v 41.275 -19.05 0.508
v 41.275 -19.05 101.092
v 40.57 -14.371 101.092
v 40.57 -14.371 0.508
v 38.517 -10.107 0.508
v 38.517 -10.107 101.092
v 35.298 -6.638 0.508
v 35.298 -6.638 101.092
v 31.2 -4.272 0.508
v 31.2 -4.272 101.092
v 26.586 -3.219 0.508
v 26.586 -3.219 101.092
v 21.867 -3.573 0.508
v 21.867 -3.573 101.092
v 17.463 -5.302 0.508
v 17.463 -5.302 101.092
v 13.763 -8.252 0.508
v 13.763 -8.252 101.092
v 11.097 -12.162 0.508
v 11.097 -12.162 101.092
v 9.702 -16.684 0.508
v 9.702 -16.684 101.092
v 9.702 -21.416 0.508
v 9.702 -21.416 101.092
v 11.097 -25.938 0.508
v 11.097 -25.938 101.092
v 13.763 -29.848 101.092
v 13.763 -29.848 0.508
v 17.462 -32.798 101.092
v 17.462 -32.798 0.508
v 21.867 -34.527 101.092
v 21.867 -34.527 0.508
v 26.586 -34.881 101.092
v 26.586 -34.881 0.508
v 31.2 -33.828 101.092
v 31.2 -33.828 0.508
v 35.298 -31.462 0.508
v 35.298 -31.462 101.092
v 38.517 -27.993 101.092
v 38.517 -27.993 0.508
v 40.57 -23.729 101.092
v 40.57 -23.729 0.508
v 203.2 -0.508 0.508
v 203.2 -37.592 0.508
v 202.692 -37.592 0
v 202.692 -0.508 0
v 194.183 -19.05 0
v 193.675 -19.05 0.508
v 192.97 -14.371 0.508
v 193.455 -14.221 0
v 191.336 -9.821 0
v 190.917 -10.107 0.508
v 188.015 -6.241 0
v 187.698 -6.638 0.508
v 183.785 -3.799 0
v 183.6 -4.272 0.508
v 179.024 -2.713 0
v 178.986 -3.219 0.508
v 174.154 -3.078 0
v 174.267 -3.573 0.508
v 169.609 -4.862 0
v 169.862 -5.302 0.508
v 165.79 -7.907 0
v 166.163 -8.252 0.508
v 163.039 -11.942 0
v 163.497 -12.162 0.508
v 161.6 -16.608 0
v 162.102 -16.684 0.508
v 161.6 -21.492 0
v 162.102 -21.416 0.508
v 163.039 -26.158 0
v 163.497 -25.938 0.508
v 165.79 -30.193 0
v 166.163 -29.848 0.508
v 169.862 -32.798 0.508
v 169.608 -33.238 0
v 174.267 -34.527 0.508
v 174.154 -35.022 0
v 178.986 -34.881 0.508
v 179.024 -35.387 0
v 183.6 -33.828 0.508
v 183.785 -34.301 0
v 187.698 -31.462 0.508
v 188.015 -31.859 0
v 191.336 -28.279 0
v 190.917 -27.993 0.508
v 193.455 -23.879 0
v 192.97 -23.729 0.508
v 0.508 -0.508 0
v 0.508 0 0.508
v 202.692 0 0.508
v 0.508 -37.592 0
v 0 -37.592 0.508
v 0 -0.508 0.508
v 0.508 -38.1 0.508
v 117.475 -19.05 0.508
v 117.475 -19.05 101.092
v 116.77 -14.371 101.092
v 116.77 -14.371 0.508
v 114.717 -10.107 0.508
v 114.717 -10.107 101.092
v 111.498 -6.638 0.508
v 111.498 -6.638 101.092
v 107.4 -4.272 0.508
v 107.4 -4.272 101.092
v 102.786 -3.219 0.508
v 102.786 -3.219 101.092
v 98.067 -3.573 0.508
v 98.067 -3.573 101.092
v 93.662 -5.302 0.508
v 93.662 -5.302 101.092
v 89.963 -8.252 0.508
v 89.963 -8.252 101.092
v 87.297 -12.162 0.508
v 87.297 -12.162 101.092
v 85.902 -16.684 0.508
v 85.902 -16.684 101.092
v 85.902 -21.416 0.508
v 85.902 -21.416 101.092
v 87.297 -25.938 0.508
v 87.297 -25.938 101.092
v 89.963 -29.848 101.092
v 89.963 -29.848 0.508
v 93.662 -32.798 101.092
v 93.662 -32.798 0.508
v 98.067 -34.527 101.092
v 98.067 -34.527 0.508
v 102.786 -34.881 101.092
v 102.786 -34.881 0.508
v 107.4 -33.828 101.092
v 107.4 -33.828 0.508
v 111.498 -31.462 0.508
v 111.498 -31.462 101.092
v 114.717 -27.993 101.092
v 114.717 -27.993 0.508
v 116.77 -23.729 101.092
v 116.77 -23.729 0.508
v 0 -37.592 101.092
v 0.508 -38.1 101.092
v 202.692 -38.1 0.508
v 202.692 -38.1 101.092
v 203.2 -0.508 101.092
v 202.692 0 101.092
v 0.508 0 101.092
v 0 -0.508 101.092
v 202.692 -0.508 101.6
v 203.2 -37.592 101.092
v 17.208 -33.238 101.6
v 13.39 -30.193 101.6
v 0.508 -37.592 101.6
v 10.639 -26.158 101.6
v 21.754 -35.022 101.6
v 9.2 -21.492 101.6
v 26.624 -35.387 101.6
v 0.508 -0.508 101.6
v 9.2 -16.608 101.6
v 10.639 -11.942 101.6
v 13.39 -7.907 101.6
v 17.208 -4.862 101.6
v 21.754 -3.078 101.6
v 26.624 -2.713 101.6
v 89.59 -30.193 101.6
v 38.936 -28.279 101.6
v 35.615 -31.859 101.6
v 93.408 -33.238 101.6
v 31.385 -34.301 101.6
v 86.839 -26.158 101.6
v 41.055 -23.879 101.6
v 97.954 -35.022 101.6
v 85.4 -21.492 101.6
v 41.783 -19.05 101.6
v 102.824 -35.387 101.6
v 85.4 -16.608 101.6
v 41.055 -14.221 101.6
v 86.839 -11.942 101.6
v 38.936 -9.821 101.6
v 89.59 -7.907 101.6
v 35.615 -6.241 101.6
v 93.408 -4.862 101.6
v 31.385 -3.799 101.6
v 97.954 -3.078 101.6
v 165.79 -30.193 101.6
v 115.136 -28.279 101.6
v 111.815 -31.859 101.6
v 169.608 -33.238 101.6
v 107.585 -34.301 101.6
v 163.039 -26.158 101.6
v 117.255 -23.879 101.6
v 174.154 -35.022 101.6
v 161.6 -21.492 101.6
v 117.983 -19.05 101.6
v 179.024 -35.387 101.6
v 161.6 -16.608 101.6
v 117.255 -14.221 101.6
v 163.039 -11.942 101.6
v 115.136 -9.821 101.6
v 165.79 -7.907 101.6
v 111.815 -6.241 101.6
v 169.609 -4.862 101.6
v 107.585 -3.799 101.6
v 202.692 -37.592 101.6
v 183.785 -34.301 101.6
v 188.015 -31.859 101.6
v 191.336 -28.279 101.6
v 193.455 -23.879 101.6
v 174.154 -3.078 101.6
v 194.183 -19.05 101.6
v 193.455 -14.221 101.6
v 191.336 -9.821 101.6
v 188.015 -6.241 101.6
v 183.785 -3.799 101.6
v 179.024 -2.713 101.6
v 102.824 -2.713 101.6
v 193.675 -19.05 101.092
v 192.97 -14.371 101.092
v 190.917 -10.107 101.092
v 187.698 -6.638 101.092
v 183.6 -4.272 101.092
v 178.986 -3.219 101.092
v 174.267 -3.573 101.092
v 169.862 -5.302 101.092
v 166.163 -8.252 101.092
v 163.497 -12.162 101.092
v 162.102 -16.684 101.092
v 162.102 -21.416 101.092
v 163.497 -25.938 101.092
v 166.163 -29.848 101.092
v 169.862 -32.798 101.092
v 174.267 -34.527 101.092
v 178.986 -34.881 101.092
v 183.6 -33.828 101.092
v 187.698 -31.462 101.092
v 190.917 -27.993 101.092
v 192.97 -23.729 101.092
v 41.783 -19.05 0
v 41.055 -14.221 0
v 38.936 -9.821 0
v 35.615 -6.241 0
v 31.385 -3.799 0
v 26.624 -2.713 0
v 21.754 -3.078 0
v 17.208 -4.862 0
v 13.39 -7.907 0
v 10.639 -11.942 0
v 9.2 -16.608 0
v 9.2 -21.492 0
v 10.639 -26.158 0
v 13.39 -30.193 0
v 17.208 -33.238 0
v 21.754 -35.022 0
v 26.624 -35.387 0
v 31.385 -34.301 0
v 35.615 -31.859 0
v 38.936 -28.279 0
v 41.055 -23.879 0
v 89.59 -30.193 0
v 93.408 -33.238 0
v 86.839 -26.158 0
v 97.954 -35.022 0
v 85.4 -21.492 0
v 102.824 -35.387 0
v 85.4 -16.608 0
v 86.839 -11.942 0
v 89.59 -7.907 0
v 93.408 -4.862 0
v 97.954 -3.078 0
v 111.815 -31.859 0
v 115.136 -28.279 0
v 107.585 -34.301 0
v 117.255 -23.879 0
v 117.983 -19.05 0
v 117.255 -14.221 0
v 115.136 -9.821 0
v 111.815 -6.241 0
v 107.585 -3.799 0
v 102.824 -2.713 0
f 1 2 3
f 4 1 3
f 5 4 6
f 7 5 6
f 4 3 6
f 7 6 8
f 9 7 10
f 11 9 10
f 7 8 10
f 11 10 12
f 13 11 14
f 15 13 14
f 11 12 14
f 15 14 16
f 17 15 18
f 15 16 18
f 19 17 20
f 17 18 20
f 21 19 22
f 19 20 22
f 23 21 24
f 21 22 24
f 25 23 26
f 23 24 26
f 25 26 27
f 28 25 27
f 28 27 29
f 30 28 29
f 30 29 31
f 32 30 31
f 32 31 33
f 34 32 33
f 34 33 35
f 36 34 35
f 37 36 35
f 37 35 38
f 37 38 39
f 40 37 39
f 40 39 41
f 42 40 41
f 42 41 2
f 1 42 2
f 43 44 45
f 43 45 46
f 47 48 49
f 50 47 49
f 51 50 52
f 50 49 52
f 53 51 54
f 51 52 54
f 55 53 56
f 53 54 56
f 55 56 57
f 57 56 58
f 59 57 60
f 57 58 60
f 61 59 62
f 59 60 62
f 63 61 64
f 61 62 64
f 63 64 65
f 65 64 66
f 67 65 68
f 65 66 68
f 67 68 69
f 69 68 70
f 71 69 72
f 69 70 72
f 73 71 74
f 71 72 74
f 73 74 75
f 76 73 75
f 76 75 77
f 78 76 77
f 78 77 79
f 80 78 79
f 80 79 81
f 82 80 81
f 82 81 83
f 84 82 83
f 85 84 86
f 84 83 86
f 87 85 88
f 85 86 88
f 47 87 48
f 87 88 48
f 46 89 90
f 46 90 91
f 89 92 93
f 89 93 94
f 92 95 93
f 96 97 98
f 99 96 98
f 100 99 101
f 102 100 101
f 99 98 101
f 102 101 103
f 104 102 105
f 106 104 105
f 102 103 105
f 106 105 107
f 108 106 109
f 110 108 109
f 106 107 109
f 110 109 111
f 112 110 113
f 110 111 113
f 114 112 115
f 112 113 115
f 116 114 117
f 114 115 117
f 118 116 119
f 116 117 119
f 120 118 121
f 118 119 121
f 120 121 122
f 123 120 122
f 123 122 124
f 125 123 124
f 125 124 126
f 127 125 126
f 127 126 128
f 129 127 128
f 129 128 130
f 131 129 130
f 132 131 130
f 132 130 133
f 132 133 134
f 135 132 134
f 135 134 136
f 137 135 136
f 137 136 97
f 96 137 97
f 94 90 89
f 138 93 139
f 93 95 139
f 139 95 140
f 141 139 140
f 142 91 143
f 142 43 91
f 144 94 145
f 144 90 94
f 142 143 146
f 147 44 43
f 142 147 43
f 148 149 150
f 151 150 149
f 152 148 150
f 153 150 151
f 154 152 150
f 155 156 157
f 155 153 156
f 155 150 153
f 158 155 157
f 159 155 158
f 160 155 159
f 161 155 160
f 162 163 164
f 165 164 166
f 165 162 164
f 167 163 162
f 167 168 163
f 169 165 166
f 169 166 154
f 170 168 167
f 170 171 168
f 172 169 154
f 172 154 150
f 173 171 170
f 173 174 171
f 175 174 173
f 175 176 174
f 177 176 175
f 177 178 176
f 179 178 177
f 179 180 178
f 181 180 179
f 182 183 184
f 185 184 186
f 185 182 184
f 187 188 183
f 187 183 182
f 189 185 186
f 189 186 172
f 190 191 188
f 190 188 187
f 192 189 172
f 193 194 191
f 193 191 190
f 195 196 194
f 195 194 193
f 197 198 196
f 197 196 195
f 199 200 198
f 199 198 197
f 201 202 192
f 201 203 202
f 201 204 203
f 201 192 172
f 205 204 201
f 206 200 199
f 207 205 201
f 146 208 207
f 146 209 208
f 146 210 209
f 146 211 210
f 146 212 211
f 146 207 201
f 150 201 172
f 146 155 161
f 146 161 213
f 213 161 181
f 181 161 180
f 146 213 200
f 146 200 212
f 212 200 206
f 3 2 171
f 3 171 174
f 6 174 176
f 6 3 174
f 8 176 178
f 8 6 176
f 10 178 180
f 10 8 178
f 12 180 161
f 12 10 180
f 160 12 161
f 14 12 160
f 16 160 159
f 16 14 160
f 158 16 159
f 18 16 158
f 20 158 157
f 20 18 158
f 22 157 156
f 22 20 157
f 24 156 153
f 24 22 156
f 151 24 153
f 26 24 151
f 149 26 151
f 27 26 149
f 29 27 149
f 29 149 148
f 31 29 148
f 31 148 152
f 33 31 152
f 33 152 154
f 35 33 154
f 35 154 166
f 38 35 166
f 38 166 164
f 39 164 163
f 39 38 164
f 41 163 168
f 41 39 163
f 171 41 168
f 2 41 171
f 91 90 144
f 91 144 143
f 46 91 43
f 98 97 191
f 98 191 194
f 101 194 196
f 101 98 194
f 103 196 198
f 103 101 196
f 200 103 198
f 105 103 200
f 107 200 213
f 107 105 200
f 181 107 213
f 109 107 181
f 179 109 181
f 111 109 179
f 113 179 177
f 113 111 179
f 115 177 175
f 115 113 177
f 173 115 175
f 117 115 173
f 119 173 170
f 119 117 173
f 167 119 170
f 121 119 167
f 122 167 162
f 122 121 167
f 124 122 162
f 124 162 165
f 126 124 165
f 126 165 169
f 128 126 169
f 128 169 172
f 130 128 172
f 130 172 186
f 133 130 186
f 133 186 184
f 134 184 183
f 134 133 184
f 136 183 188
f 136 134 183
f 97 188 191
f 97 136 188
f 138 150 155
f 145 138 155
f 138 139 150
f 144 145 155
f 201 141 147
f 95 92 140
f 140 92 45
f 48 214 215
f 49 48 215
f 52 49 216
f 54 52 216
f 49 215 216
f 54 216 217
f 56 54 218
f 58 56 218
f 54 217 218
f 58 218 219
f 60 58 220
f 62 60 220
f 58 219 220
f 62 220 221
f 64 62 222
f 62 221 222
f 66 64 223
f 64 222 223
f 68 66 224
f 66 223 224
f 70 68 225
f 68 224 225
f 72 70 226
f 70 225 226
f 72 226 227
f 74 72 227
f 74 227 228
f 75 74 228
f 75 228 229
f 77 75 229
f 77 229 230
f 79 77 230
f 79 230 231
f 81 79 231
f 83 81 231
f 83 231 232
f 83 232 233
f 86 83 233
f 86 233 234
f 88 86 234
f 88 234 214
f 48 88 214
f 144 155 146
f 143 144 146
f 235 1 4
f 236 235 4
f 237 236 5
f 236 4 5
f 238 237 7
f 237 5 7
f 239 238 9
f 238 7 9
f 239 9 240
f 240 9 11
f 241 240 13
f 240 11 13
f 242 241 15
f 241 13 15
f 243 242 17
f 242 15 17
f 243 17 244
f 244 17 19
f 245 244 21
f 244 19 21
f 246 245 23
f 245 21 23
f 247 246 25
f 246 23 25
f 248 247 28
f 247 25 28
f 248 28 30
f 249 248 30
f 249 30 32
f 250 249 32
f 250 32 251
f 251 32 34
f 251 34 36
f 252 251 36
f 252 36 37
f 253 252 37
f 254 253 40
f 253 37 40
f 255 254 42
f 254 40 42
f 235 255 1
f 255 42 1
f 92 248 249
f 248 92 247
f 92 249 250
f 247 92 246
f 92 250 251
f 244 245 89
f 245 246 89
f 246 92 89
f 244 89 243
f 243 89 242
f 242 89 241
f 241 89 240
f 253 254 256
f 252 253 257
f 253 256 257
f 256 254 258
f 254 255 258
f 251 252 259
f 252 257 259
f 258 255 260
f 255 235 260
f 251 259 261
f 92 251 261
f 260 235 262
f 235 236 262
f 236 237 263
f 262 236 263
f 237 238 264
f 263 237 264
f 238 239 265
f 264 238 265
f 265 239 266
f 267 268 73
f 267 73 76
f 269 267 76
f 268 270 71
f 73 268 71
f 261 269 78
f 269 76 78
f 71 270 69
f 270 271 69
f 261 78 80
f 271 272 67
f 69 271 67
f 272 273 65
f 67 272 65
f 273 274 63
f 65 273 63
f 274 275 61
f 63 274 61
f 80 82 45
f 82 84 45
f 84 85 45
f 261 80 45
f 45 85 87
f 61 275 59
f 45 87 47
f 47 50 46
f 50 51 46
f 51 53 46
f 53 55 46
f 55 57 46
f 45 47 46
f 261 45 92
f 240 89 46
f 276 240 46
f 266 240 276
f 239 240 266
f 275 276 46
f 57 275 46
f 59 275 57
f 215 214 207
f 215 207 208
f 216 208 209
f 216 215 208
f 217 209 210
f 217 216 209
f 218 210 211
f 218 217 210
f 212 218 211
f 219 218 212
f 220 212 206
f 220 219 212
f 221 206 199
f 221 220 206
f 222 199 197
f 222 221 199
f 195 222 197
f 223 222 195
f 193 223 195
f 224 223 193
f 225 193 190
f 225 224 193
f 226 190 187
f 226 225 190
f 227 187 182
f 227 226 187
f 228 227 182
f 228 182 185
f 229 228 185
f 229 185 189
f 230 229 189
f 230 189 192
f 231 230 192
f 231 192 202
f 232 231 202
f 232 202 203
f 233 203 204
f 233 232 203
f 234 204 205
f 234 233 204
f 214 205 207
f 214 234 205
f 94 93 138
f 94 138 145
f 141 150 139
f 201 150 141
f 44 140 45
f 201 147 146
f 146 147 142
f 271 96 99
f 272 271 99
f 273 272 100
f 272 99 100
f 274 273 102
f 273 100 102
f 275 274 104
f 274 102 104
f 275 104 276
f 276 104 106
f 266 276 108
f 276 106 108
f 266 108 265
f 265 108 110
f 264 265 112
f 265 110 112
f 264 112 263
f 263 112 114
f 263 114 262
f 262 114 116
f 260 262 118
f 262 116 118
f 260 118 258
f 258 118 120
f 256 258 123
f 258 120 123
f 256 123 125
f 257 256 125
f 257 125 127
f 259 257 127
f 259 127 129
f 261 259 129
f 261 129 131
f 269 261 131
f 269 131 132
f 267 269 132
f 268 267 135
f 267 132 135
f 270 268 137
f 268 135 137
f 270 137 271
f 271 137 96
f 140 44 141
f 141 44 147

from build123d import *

# Parameters (mm, degrees)
F0_W     = 203.2
F0_H     = 38.1
F1_DEPTH = 101.6
F2_R     = 15.875
F3_DEPTH = 101.601
F4_SIZE  = 0.508


with BuildPart() as f1:
    # F0 (on Top) → F1 (new body)
    with BuildSketch(Plane.XY):
        with Locations((101.6, -19.05)):
            Rectangle(F0_W, F0_H)
    extrude(amount=F1_DEPTH)

    # F2 (on face) → F3 (cut, through all)
    with BuildSketch(Plane.XY.offset(101.6)):
        with Locations((25.4, -19.05)):
            Circle(F2_R)
        with Locations((177.8, -19.05)):
            Circle(F2_R)
        with Locations((101.6, -19.05)):
            Circle(F2_R)
    extrude(amount=-F3_DEPTH, mode=Mode.SUBTRACT)

    # F4
    f4_edges = [f1.edges().sort_by_distance(p)[0] for p in [
        (203.2, 0, 50.8),
        (203.2, -38.1, 50.8),
        (0, 0, 50.8),
        (0, -38.1, 50.8),
        (101.6, -38.1, 101.6),
        (0, -19.05, 101.6),
        (101.6, 0, 101.6),
        (101.6, -38.1, 0),
        (101.6, 0, 0),
        (0, -19.05, 0),
        (203.2, -19.05, 0),
        (203.2, -19.05, 101.6),
        (161.925, -19.05, 101.6),
        (85.725, -19.05, 101.6),
        (9.525, -19.05, 101.6),
        (9.525, -19.05, 0),
        (85.725, -19.05, 0),
        (161.925, -19.05, 0),
    ]]
    chamfer(f4_edges, length=F4_SIZE)


solid = f1.part
